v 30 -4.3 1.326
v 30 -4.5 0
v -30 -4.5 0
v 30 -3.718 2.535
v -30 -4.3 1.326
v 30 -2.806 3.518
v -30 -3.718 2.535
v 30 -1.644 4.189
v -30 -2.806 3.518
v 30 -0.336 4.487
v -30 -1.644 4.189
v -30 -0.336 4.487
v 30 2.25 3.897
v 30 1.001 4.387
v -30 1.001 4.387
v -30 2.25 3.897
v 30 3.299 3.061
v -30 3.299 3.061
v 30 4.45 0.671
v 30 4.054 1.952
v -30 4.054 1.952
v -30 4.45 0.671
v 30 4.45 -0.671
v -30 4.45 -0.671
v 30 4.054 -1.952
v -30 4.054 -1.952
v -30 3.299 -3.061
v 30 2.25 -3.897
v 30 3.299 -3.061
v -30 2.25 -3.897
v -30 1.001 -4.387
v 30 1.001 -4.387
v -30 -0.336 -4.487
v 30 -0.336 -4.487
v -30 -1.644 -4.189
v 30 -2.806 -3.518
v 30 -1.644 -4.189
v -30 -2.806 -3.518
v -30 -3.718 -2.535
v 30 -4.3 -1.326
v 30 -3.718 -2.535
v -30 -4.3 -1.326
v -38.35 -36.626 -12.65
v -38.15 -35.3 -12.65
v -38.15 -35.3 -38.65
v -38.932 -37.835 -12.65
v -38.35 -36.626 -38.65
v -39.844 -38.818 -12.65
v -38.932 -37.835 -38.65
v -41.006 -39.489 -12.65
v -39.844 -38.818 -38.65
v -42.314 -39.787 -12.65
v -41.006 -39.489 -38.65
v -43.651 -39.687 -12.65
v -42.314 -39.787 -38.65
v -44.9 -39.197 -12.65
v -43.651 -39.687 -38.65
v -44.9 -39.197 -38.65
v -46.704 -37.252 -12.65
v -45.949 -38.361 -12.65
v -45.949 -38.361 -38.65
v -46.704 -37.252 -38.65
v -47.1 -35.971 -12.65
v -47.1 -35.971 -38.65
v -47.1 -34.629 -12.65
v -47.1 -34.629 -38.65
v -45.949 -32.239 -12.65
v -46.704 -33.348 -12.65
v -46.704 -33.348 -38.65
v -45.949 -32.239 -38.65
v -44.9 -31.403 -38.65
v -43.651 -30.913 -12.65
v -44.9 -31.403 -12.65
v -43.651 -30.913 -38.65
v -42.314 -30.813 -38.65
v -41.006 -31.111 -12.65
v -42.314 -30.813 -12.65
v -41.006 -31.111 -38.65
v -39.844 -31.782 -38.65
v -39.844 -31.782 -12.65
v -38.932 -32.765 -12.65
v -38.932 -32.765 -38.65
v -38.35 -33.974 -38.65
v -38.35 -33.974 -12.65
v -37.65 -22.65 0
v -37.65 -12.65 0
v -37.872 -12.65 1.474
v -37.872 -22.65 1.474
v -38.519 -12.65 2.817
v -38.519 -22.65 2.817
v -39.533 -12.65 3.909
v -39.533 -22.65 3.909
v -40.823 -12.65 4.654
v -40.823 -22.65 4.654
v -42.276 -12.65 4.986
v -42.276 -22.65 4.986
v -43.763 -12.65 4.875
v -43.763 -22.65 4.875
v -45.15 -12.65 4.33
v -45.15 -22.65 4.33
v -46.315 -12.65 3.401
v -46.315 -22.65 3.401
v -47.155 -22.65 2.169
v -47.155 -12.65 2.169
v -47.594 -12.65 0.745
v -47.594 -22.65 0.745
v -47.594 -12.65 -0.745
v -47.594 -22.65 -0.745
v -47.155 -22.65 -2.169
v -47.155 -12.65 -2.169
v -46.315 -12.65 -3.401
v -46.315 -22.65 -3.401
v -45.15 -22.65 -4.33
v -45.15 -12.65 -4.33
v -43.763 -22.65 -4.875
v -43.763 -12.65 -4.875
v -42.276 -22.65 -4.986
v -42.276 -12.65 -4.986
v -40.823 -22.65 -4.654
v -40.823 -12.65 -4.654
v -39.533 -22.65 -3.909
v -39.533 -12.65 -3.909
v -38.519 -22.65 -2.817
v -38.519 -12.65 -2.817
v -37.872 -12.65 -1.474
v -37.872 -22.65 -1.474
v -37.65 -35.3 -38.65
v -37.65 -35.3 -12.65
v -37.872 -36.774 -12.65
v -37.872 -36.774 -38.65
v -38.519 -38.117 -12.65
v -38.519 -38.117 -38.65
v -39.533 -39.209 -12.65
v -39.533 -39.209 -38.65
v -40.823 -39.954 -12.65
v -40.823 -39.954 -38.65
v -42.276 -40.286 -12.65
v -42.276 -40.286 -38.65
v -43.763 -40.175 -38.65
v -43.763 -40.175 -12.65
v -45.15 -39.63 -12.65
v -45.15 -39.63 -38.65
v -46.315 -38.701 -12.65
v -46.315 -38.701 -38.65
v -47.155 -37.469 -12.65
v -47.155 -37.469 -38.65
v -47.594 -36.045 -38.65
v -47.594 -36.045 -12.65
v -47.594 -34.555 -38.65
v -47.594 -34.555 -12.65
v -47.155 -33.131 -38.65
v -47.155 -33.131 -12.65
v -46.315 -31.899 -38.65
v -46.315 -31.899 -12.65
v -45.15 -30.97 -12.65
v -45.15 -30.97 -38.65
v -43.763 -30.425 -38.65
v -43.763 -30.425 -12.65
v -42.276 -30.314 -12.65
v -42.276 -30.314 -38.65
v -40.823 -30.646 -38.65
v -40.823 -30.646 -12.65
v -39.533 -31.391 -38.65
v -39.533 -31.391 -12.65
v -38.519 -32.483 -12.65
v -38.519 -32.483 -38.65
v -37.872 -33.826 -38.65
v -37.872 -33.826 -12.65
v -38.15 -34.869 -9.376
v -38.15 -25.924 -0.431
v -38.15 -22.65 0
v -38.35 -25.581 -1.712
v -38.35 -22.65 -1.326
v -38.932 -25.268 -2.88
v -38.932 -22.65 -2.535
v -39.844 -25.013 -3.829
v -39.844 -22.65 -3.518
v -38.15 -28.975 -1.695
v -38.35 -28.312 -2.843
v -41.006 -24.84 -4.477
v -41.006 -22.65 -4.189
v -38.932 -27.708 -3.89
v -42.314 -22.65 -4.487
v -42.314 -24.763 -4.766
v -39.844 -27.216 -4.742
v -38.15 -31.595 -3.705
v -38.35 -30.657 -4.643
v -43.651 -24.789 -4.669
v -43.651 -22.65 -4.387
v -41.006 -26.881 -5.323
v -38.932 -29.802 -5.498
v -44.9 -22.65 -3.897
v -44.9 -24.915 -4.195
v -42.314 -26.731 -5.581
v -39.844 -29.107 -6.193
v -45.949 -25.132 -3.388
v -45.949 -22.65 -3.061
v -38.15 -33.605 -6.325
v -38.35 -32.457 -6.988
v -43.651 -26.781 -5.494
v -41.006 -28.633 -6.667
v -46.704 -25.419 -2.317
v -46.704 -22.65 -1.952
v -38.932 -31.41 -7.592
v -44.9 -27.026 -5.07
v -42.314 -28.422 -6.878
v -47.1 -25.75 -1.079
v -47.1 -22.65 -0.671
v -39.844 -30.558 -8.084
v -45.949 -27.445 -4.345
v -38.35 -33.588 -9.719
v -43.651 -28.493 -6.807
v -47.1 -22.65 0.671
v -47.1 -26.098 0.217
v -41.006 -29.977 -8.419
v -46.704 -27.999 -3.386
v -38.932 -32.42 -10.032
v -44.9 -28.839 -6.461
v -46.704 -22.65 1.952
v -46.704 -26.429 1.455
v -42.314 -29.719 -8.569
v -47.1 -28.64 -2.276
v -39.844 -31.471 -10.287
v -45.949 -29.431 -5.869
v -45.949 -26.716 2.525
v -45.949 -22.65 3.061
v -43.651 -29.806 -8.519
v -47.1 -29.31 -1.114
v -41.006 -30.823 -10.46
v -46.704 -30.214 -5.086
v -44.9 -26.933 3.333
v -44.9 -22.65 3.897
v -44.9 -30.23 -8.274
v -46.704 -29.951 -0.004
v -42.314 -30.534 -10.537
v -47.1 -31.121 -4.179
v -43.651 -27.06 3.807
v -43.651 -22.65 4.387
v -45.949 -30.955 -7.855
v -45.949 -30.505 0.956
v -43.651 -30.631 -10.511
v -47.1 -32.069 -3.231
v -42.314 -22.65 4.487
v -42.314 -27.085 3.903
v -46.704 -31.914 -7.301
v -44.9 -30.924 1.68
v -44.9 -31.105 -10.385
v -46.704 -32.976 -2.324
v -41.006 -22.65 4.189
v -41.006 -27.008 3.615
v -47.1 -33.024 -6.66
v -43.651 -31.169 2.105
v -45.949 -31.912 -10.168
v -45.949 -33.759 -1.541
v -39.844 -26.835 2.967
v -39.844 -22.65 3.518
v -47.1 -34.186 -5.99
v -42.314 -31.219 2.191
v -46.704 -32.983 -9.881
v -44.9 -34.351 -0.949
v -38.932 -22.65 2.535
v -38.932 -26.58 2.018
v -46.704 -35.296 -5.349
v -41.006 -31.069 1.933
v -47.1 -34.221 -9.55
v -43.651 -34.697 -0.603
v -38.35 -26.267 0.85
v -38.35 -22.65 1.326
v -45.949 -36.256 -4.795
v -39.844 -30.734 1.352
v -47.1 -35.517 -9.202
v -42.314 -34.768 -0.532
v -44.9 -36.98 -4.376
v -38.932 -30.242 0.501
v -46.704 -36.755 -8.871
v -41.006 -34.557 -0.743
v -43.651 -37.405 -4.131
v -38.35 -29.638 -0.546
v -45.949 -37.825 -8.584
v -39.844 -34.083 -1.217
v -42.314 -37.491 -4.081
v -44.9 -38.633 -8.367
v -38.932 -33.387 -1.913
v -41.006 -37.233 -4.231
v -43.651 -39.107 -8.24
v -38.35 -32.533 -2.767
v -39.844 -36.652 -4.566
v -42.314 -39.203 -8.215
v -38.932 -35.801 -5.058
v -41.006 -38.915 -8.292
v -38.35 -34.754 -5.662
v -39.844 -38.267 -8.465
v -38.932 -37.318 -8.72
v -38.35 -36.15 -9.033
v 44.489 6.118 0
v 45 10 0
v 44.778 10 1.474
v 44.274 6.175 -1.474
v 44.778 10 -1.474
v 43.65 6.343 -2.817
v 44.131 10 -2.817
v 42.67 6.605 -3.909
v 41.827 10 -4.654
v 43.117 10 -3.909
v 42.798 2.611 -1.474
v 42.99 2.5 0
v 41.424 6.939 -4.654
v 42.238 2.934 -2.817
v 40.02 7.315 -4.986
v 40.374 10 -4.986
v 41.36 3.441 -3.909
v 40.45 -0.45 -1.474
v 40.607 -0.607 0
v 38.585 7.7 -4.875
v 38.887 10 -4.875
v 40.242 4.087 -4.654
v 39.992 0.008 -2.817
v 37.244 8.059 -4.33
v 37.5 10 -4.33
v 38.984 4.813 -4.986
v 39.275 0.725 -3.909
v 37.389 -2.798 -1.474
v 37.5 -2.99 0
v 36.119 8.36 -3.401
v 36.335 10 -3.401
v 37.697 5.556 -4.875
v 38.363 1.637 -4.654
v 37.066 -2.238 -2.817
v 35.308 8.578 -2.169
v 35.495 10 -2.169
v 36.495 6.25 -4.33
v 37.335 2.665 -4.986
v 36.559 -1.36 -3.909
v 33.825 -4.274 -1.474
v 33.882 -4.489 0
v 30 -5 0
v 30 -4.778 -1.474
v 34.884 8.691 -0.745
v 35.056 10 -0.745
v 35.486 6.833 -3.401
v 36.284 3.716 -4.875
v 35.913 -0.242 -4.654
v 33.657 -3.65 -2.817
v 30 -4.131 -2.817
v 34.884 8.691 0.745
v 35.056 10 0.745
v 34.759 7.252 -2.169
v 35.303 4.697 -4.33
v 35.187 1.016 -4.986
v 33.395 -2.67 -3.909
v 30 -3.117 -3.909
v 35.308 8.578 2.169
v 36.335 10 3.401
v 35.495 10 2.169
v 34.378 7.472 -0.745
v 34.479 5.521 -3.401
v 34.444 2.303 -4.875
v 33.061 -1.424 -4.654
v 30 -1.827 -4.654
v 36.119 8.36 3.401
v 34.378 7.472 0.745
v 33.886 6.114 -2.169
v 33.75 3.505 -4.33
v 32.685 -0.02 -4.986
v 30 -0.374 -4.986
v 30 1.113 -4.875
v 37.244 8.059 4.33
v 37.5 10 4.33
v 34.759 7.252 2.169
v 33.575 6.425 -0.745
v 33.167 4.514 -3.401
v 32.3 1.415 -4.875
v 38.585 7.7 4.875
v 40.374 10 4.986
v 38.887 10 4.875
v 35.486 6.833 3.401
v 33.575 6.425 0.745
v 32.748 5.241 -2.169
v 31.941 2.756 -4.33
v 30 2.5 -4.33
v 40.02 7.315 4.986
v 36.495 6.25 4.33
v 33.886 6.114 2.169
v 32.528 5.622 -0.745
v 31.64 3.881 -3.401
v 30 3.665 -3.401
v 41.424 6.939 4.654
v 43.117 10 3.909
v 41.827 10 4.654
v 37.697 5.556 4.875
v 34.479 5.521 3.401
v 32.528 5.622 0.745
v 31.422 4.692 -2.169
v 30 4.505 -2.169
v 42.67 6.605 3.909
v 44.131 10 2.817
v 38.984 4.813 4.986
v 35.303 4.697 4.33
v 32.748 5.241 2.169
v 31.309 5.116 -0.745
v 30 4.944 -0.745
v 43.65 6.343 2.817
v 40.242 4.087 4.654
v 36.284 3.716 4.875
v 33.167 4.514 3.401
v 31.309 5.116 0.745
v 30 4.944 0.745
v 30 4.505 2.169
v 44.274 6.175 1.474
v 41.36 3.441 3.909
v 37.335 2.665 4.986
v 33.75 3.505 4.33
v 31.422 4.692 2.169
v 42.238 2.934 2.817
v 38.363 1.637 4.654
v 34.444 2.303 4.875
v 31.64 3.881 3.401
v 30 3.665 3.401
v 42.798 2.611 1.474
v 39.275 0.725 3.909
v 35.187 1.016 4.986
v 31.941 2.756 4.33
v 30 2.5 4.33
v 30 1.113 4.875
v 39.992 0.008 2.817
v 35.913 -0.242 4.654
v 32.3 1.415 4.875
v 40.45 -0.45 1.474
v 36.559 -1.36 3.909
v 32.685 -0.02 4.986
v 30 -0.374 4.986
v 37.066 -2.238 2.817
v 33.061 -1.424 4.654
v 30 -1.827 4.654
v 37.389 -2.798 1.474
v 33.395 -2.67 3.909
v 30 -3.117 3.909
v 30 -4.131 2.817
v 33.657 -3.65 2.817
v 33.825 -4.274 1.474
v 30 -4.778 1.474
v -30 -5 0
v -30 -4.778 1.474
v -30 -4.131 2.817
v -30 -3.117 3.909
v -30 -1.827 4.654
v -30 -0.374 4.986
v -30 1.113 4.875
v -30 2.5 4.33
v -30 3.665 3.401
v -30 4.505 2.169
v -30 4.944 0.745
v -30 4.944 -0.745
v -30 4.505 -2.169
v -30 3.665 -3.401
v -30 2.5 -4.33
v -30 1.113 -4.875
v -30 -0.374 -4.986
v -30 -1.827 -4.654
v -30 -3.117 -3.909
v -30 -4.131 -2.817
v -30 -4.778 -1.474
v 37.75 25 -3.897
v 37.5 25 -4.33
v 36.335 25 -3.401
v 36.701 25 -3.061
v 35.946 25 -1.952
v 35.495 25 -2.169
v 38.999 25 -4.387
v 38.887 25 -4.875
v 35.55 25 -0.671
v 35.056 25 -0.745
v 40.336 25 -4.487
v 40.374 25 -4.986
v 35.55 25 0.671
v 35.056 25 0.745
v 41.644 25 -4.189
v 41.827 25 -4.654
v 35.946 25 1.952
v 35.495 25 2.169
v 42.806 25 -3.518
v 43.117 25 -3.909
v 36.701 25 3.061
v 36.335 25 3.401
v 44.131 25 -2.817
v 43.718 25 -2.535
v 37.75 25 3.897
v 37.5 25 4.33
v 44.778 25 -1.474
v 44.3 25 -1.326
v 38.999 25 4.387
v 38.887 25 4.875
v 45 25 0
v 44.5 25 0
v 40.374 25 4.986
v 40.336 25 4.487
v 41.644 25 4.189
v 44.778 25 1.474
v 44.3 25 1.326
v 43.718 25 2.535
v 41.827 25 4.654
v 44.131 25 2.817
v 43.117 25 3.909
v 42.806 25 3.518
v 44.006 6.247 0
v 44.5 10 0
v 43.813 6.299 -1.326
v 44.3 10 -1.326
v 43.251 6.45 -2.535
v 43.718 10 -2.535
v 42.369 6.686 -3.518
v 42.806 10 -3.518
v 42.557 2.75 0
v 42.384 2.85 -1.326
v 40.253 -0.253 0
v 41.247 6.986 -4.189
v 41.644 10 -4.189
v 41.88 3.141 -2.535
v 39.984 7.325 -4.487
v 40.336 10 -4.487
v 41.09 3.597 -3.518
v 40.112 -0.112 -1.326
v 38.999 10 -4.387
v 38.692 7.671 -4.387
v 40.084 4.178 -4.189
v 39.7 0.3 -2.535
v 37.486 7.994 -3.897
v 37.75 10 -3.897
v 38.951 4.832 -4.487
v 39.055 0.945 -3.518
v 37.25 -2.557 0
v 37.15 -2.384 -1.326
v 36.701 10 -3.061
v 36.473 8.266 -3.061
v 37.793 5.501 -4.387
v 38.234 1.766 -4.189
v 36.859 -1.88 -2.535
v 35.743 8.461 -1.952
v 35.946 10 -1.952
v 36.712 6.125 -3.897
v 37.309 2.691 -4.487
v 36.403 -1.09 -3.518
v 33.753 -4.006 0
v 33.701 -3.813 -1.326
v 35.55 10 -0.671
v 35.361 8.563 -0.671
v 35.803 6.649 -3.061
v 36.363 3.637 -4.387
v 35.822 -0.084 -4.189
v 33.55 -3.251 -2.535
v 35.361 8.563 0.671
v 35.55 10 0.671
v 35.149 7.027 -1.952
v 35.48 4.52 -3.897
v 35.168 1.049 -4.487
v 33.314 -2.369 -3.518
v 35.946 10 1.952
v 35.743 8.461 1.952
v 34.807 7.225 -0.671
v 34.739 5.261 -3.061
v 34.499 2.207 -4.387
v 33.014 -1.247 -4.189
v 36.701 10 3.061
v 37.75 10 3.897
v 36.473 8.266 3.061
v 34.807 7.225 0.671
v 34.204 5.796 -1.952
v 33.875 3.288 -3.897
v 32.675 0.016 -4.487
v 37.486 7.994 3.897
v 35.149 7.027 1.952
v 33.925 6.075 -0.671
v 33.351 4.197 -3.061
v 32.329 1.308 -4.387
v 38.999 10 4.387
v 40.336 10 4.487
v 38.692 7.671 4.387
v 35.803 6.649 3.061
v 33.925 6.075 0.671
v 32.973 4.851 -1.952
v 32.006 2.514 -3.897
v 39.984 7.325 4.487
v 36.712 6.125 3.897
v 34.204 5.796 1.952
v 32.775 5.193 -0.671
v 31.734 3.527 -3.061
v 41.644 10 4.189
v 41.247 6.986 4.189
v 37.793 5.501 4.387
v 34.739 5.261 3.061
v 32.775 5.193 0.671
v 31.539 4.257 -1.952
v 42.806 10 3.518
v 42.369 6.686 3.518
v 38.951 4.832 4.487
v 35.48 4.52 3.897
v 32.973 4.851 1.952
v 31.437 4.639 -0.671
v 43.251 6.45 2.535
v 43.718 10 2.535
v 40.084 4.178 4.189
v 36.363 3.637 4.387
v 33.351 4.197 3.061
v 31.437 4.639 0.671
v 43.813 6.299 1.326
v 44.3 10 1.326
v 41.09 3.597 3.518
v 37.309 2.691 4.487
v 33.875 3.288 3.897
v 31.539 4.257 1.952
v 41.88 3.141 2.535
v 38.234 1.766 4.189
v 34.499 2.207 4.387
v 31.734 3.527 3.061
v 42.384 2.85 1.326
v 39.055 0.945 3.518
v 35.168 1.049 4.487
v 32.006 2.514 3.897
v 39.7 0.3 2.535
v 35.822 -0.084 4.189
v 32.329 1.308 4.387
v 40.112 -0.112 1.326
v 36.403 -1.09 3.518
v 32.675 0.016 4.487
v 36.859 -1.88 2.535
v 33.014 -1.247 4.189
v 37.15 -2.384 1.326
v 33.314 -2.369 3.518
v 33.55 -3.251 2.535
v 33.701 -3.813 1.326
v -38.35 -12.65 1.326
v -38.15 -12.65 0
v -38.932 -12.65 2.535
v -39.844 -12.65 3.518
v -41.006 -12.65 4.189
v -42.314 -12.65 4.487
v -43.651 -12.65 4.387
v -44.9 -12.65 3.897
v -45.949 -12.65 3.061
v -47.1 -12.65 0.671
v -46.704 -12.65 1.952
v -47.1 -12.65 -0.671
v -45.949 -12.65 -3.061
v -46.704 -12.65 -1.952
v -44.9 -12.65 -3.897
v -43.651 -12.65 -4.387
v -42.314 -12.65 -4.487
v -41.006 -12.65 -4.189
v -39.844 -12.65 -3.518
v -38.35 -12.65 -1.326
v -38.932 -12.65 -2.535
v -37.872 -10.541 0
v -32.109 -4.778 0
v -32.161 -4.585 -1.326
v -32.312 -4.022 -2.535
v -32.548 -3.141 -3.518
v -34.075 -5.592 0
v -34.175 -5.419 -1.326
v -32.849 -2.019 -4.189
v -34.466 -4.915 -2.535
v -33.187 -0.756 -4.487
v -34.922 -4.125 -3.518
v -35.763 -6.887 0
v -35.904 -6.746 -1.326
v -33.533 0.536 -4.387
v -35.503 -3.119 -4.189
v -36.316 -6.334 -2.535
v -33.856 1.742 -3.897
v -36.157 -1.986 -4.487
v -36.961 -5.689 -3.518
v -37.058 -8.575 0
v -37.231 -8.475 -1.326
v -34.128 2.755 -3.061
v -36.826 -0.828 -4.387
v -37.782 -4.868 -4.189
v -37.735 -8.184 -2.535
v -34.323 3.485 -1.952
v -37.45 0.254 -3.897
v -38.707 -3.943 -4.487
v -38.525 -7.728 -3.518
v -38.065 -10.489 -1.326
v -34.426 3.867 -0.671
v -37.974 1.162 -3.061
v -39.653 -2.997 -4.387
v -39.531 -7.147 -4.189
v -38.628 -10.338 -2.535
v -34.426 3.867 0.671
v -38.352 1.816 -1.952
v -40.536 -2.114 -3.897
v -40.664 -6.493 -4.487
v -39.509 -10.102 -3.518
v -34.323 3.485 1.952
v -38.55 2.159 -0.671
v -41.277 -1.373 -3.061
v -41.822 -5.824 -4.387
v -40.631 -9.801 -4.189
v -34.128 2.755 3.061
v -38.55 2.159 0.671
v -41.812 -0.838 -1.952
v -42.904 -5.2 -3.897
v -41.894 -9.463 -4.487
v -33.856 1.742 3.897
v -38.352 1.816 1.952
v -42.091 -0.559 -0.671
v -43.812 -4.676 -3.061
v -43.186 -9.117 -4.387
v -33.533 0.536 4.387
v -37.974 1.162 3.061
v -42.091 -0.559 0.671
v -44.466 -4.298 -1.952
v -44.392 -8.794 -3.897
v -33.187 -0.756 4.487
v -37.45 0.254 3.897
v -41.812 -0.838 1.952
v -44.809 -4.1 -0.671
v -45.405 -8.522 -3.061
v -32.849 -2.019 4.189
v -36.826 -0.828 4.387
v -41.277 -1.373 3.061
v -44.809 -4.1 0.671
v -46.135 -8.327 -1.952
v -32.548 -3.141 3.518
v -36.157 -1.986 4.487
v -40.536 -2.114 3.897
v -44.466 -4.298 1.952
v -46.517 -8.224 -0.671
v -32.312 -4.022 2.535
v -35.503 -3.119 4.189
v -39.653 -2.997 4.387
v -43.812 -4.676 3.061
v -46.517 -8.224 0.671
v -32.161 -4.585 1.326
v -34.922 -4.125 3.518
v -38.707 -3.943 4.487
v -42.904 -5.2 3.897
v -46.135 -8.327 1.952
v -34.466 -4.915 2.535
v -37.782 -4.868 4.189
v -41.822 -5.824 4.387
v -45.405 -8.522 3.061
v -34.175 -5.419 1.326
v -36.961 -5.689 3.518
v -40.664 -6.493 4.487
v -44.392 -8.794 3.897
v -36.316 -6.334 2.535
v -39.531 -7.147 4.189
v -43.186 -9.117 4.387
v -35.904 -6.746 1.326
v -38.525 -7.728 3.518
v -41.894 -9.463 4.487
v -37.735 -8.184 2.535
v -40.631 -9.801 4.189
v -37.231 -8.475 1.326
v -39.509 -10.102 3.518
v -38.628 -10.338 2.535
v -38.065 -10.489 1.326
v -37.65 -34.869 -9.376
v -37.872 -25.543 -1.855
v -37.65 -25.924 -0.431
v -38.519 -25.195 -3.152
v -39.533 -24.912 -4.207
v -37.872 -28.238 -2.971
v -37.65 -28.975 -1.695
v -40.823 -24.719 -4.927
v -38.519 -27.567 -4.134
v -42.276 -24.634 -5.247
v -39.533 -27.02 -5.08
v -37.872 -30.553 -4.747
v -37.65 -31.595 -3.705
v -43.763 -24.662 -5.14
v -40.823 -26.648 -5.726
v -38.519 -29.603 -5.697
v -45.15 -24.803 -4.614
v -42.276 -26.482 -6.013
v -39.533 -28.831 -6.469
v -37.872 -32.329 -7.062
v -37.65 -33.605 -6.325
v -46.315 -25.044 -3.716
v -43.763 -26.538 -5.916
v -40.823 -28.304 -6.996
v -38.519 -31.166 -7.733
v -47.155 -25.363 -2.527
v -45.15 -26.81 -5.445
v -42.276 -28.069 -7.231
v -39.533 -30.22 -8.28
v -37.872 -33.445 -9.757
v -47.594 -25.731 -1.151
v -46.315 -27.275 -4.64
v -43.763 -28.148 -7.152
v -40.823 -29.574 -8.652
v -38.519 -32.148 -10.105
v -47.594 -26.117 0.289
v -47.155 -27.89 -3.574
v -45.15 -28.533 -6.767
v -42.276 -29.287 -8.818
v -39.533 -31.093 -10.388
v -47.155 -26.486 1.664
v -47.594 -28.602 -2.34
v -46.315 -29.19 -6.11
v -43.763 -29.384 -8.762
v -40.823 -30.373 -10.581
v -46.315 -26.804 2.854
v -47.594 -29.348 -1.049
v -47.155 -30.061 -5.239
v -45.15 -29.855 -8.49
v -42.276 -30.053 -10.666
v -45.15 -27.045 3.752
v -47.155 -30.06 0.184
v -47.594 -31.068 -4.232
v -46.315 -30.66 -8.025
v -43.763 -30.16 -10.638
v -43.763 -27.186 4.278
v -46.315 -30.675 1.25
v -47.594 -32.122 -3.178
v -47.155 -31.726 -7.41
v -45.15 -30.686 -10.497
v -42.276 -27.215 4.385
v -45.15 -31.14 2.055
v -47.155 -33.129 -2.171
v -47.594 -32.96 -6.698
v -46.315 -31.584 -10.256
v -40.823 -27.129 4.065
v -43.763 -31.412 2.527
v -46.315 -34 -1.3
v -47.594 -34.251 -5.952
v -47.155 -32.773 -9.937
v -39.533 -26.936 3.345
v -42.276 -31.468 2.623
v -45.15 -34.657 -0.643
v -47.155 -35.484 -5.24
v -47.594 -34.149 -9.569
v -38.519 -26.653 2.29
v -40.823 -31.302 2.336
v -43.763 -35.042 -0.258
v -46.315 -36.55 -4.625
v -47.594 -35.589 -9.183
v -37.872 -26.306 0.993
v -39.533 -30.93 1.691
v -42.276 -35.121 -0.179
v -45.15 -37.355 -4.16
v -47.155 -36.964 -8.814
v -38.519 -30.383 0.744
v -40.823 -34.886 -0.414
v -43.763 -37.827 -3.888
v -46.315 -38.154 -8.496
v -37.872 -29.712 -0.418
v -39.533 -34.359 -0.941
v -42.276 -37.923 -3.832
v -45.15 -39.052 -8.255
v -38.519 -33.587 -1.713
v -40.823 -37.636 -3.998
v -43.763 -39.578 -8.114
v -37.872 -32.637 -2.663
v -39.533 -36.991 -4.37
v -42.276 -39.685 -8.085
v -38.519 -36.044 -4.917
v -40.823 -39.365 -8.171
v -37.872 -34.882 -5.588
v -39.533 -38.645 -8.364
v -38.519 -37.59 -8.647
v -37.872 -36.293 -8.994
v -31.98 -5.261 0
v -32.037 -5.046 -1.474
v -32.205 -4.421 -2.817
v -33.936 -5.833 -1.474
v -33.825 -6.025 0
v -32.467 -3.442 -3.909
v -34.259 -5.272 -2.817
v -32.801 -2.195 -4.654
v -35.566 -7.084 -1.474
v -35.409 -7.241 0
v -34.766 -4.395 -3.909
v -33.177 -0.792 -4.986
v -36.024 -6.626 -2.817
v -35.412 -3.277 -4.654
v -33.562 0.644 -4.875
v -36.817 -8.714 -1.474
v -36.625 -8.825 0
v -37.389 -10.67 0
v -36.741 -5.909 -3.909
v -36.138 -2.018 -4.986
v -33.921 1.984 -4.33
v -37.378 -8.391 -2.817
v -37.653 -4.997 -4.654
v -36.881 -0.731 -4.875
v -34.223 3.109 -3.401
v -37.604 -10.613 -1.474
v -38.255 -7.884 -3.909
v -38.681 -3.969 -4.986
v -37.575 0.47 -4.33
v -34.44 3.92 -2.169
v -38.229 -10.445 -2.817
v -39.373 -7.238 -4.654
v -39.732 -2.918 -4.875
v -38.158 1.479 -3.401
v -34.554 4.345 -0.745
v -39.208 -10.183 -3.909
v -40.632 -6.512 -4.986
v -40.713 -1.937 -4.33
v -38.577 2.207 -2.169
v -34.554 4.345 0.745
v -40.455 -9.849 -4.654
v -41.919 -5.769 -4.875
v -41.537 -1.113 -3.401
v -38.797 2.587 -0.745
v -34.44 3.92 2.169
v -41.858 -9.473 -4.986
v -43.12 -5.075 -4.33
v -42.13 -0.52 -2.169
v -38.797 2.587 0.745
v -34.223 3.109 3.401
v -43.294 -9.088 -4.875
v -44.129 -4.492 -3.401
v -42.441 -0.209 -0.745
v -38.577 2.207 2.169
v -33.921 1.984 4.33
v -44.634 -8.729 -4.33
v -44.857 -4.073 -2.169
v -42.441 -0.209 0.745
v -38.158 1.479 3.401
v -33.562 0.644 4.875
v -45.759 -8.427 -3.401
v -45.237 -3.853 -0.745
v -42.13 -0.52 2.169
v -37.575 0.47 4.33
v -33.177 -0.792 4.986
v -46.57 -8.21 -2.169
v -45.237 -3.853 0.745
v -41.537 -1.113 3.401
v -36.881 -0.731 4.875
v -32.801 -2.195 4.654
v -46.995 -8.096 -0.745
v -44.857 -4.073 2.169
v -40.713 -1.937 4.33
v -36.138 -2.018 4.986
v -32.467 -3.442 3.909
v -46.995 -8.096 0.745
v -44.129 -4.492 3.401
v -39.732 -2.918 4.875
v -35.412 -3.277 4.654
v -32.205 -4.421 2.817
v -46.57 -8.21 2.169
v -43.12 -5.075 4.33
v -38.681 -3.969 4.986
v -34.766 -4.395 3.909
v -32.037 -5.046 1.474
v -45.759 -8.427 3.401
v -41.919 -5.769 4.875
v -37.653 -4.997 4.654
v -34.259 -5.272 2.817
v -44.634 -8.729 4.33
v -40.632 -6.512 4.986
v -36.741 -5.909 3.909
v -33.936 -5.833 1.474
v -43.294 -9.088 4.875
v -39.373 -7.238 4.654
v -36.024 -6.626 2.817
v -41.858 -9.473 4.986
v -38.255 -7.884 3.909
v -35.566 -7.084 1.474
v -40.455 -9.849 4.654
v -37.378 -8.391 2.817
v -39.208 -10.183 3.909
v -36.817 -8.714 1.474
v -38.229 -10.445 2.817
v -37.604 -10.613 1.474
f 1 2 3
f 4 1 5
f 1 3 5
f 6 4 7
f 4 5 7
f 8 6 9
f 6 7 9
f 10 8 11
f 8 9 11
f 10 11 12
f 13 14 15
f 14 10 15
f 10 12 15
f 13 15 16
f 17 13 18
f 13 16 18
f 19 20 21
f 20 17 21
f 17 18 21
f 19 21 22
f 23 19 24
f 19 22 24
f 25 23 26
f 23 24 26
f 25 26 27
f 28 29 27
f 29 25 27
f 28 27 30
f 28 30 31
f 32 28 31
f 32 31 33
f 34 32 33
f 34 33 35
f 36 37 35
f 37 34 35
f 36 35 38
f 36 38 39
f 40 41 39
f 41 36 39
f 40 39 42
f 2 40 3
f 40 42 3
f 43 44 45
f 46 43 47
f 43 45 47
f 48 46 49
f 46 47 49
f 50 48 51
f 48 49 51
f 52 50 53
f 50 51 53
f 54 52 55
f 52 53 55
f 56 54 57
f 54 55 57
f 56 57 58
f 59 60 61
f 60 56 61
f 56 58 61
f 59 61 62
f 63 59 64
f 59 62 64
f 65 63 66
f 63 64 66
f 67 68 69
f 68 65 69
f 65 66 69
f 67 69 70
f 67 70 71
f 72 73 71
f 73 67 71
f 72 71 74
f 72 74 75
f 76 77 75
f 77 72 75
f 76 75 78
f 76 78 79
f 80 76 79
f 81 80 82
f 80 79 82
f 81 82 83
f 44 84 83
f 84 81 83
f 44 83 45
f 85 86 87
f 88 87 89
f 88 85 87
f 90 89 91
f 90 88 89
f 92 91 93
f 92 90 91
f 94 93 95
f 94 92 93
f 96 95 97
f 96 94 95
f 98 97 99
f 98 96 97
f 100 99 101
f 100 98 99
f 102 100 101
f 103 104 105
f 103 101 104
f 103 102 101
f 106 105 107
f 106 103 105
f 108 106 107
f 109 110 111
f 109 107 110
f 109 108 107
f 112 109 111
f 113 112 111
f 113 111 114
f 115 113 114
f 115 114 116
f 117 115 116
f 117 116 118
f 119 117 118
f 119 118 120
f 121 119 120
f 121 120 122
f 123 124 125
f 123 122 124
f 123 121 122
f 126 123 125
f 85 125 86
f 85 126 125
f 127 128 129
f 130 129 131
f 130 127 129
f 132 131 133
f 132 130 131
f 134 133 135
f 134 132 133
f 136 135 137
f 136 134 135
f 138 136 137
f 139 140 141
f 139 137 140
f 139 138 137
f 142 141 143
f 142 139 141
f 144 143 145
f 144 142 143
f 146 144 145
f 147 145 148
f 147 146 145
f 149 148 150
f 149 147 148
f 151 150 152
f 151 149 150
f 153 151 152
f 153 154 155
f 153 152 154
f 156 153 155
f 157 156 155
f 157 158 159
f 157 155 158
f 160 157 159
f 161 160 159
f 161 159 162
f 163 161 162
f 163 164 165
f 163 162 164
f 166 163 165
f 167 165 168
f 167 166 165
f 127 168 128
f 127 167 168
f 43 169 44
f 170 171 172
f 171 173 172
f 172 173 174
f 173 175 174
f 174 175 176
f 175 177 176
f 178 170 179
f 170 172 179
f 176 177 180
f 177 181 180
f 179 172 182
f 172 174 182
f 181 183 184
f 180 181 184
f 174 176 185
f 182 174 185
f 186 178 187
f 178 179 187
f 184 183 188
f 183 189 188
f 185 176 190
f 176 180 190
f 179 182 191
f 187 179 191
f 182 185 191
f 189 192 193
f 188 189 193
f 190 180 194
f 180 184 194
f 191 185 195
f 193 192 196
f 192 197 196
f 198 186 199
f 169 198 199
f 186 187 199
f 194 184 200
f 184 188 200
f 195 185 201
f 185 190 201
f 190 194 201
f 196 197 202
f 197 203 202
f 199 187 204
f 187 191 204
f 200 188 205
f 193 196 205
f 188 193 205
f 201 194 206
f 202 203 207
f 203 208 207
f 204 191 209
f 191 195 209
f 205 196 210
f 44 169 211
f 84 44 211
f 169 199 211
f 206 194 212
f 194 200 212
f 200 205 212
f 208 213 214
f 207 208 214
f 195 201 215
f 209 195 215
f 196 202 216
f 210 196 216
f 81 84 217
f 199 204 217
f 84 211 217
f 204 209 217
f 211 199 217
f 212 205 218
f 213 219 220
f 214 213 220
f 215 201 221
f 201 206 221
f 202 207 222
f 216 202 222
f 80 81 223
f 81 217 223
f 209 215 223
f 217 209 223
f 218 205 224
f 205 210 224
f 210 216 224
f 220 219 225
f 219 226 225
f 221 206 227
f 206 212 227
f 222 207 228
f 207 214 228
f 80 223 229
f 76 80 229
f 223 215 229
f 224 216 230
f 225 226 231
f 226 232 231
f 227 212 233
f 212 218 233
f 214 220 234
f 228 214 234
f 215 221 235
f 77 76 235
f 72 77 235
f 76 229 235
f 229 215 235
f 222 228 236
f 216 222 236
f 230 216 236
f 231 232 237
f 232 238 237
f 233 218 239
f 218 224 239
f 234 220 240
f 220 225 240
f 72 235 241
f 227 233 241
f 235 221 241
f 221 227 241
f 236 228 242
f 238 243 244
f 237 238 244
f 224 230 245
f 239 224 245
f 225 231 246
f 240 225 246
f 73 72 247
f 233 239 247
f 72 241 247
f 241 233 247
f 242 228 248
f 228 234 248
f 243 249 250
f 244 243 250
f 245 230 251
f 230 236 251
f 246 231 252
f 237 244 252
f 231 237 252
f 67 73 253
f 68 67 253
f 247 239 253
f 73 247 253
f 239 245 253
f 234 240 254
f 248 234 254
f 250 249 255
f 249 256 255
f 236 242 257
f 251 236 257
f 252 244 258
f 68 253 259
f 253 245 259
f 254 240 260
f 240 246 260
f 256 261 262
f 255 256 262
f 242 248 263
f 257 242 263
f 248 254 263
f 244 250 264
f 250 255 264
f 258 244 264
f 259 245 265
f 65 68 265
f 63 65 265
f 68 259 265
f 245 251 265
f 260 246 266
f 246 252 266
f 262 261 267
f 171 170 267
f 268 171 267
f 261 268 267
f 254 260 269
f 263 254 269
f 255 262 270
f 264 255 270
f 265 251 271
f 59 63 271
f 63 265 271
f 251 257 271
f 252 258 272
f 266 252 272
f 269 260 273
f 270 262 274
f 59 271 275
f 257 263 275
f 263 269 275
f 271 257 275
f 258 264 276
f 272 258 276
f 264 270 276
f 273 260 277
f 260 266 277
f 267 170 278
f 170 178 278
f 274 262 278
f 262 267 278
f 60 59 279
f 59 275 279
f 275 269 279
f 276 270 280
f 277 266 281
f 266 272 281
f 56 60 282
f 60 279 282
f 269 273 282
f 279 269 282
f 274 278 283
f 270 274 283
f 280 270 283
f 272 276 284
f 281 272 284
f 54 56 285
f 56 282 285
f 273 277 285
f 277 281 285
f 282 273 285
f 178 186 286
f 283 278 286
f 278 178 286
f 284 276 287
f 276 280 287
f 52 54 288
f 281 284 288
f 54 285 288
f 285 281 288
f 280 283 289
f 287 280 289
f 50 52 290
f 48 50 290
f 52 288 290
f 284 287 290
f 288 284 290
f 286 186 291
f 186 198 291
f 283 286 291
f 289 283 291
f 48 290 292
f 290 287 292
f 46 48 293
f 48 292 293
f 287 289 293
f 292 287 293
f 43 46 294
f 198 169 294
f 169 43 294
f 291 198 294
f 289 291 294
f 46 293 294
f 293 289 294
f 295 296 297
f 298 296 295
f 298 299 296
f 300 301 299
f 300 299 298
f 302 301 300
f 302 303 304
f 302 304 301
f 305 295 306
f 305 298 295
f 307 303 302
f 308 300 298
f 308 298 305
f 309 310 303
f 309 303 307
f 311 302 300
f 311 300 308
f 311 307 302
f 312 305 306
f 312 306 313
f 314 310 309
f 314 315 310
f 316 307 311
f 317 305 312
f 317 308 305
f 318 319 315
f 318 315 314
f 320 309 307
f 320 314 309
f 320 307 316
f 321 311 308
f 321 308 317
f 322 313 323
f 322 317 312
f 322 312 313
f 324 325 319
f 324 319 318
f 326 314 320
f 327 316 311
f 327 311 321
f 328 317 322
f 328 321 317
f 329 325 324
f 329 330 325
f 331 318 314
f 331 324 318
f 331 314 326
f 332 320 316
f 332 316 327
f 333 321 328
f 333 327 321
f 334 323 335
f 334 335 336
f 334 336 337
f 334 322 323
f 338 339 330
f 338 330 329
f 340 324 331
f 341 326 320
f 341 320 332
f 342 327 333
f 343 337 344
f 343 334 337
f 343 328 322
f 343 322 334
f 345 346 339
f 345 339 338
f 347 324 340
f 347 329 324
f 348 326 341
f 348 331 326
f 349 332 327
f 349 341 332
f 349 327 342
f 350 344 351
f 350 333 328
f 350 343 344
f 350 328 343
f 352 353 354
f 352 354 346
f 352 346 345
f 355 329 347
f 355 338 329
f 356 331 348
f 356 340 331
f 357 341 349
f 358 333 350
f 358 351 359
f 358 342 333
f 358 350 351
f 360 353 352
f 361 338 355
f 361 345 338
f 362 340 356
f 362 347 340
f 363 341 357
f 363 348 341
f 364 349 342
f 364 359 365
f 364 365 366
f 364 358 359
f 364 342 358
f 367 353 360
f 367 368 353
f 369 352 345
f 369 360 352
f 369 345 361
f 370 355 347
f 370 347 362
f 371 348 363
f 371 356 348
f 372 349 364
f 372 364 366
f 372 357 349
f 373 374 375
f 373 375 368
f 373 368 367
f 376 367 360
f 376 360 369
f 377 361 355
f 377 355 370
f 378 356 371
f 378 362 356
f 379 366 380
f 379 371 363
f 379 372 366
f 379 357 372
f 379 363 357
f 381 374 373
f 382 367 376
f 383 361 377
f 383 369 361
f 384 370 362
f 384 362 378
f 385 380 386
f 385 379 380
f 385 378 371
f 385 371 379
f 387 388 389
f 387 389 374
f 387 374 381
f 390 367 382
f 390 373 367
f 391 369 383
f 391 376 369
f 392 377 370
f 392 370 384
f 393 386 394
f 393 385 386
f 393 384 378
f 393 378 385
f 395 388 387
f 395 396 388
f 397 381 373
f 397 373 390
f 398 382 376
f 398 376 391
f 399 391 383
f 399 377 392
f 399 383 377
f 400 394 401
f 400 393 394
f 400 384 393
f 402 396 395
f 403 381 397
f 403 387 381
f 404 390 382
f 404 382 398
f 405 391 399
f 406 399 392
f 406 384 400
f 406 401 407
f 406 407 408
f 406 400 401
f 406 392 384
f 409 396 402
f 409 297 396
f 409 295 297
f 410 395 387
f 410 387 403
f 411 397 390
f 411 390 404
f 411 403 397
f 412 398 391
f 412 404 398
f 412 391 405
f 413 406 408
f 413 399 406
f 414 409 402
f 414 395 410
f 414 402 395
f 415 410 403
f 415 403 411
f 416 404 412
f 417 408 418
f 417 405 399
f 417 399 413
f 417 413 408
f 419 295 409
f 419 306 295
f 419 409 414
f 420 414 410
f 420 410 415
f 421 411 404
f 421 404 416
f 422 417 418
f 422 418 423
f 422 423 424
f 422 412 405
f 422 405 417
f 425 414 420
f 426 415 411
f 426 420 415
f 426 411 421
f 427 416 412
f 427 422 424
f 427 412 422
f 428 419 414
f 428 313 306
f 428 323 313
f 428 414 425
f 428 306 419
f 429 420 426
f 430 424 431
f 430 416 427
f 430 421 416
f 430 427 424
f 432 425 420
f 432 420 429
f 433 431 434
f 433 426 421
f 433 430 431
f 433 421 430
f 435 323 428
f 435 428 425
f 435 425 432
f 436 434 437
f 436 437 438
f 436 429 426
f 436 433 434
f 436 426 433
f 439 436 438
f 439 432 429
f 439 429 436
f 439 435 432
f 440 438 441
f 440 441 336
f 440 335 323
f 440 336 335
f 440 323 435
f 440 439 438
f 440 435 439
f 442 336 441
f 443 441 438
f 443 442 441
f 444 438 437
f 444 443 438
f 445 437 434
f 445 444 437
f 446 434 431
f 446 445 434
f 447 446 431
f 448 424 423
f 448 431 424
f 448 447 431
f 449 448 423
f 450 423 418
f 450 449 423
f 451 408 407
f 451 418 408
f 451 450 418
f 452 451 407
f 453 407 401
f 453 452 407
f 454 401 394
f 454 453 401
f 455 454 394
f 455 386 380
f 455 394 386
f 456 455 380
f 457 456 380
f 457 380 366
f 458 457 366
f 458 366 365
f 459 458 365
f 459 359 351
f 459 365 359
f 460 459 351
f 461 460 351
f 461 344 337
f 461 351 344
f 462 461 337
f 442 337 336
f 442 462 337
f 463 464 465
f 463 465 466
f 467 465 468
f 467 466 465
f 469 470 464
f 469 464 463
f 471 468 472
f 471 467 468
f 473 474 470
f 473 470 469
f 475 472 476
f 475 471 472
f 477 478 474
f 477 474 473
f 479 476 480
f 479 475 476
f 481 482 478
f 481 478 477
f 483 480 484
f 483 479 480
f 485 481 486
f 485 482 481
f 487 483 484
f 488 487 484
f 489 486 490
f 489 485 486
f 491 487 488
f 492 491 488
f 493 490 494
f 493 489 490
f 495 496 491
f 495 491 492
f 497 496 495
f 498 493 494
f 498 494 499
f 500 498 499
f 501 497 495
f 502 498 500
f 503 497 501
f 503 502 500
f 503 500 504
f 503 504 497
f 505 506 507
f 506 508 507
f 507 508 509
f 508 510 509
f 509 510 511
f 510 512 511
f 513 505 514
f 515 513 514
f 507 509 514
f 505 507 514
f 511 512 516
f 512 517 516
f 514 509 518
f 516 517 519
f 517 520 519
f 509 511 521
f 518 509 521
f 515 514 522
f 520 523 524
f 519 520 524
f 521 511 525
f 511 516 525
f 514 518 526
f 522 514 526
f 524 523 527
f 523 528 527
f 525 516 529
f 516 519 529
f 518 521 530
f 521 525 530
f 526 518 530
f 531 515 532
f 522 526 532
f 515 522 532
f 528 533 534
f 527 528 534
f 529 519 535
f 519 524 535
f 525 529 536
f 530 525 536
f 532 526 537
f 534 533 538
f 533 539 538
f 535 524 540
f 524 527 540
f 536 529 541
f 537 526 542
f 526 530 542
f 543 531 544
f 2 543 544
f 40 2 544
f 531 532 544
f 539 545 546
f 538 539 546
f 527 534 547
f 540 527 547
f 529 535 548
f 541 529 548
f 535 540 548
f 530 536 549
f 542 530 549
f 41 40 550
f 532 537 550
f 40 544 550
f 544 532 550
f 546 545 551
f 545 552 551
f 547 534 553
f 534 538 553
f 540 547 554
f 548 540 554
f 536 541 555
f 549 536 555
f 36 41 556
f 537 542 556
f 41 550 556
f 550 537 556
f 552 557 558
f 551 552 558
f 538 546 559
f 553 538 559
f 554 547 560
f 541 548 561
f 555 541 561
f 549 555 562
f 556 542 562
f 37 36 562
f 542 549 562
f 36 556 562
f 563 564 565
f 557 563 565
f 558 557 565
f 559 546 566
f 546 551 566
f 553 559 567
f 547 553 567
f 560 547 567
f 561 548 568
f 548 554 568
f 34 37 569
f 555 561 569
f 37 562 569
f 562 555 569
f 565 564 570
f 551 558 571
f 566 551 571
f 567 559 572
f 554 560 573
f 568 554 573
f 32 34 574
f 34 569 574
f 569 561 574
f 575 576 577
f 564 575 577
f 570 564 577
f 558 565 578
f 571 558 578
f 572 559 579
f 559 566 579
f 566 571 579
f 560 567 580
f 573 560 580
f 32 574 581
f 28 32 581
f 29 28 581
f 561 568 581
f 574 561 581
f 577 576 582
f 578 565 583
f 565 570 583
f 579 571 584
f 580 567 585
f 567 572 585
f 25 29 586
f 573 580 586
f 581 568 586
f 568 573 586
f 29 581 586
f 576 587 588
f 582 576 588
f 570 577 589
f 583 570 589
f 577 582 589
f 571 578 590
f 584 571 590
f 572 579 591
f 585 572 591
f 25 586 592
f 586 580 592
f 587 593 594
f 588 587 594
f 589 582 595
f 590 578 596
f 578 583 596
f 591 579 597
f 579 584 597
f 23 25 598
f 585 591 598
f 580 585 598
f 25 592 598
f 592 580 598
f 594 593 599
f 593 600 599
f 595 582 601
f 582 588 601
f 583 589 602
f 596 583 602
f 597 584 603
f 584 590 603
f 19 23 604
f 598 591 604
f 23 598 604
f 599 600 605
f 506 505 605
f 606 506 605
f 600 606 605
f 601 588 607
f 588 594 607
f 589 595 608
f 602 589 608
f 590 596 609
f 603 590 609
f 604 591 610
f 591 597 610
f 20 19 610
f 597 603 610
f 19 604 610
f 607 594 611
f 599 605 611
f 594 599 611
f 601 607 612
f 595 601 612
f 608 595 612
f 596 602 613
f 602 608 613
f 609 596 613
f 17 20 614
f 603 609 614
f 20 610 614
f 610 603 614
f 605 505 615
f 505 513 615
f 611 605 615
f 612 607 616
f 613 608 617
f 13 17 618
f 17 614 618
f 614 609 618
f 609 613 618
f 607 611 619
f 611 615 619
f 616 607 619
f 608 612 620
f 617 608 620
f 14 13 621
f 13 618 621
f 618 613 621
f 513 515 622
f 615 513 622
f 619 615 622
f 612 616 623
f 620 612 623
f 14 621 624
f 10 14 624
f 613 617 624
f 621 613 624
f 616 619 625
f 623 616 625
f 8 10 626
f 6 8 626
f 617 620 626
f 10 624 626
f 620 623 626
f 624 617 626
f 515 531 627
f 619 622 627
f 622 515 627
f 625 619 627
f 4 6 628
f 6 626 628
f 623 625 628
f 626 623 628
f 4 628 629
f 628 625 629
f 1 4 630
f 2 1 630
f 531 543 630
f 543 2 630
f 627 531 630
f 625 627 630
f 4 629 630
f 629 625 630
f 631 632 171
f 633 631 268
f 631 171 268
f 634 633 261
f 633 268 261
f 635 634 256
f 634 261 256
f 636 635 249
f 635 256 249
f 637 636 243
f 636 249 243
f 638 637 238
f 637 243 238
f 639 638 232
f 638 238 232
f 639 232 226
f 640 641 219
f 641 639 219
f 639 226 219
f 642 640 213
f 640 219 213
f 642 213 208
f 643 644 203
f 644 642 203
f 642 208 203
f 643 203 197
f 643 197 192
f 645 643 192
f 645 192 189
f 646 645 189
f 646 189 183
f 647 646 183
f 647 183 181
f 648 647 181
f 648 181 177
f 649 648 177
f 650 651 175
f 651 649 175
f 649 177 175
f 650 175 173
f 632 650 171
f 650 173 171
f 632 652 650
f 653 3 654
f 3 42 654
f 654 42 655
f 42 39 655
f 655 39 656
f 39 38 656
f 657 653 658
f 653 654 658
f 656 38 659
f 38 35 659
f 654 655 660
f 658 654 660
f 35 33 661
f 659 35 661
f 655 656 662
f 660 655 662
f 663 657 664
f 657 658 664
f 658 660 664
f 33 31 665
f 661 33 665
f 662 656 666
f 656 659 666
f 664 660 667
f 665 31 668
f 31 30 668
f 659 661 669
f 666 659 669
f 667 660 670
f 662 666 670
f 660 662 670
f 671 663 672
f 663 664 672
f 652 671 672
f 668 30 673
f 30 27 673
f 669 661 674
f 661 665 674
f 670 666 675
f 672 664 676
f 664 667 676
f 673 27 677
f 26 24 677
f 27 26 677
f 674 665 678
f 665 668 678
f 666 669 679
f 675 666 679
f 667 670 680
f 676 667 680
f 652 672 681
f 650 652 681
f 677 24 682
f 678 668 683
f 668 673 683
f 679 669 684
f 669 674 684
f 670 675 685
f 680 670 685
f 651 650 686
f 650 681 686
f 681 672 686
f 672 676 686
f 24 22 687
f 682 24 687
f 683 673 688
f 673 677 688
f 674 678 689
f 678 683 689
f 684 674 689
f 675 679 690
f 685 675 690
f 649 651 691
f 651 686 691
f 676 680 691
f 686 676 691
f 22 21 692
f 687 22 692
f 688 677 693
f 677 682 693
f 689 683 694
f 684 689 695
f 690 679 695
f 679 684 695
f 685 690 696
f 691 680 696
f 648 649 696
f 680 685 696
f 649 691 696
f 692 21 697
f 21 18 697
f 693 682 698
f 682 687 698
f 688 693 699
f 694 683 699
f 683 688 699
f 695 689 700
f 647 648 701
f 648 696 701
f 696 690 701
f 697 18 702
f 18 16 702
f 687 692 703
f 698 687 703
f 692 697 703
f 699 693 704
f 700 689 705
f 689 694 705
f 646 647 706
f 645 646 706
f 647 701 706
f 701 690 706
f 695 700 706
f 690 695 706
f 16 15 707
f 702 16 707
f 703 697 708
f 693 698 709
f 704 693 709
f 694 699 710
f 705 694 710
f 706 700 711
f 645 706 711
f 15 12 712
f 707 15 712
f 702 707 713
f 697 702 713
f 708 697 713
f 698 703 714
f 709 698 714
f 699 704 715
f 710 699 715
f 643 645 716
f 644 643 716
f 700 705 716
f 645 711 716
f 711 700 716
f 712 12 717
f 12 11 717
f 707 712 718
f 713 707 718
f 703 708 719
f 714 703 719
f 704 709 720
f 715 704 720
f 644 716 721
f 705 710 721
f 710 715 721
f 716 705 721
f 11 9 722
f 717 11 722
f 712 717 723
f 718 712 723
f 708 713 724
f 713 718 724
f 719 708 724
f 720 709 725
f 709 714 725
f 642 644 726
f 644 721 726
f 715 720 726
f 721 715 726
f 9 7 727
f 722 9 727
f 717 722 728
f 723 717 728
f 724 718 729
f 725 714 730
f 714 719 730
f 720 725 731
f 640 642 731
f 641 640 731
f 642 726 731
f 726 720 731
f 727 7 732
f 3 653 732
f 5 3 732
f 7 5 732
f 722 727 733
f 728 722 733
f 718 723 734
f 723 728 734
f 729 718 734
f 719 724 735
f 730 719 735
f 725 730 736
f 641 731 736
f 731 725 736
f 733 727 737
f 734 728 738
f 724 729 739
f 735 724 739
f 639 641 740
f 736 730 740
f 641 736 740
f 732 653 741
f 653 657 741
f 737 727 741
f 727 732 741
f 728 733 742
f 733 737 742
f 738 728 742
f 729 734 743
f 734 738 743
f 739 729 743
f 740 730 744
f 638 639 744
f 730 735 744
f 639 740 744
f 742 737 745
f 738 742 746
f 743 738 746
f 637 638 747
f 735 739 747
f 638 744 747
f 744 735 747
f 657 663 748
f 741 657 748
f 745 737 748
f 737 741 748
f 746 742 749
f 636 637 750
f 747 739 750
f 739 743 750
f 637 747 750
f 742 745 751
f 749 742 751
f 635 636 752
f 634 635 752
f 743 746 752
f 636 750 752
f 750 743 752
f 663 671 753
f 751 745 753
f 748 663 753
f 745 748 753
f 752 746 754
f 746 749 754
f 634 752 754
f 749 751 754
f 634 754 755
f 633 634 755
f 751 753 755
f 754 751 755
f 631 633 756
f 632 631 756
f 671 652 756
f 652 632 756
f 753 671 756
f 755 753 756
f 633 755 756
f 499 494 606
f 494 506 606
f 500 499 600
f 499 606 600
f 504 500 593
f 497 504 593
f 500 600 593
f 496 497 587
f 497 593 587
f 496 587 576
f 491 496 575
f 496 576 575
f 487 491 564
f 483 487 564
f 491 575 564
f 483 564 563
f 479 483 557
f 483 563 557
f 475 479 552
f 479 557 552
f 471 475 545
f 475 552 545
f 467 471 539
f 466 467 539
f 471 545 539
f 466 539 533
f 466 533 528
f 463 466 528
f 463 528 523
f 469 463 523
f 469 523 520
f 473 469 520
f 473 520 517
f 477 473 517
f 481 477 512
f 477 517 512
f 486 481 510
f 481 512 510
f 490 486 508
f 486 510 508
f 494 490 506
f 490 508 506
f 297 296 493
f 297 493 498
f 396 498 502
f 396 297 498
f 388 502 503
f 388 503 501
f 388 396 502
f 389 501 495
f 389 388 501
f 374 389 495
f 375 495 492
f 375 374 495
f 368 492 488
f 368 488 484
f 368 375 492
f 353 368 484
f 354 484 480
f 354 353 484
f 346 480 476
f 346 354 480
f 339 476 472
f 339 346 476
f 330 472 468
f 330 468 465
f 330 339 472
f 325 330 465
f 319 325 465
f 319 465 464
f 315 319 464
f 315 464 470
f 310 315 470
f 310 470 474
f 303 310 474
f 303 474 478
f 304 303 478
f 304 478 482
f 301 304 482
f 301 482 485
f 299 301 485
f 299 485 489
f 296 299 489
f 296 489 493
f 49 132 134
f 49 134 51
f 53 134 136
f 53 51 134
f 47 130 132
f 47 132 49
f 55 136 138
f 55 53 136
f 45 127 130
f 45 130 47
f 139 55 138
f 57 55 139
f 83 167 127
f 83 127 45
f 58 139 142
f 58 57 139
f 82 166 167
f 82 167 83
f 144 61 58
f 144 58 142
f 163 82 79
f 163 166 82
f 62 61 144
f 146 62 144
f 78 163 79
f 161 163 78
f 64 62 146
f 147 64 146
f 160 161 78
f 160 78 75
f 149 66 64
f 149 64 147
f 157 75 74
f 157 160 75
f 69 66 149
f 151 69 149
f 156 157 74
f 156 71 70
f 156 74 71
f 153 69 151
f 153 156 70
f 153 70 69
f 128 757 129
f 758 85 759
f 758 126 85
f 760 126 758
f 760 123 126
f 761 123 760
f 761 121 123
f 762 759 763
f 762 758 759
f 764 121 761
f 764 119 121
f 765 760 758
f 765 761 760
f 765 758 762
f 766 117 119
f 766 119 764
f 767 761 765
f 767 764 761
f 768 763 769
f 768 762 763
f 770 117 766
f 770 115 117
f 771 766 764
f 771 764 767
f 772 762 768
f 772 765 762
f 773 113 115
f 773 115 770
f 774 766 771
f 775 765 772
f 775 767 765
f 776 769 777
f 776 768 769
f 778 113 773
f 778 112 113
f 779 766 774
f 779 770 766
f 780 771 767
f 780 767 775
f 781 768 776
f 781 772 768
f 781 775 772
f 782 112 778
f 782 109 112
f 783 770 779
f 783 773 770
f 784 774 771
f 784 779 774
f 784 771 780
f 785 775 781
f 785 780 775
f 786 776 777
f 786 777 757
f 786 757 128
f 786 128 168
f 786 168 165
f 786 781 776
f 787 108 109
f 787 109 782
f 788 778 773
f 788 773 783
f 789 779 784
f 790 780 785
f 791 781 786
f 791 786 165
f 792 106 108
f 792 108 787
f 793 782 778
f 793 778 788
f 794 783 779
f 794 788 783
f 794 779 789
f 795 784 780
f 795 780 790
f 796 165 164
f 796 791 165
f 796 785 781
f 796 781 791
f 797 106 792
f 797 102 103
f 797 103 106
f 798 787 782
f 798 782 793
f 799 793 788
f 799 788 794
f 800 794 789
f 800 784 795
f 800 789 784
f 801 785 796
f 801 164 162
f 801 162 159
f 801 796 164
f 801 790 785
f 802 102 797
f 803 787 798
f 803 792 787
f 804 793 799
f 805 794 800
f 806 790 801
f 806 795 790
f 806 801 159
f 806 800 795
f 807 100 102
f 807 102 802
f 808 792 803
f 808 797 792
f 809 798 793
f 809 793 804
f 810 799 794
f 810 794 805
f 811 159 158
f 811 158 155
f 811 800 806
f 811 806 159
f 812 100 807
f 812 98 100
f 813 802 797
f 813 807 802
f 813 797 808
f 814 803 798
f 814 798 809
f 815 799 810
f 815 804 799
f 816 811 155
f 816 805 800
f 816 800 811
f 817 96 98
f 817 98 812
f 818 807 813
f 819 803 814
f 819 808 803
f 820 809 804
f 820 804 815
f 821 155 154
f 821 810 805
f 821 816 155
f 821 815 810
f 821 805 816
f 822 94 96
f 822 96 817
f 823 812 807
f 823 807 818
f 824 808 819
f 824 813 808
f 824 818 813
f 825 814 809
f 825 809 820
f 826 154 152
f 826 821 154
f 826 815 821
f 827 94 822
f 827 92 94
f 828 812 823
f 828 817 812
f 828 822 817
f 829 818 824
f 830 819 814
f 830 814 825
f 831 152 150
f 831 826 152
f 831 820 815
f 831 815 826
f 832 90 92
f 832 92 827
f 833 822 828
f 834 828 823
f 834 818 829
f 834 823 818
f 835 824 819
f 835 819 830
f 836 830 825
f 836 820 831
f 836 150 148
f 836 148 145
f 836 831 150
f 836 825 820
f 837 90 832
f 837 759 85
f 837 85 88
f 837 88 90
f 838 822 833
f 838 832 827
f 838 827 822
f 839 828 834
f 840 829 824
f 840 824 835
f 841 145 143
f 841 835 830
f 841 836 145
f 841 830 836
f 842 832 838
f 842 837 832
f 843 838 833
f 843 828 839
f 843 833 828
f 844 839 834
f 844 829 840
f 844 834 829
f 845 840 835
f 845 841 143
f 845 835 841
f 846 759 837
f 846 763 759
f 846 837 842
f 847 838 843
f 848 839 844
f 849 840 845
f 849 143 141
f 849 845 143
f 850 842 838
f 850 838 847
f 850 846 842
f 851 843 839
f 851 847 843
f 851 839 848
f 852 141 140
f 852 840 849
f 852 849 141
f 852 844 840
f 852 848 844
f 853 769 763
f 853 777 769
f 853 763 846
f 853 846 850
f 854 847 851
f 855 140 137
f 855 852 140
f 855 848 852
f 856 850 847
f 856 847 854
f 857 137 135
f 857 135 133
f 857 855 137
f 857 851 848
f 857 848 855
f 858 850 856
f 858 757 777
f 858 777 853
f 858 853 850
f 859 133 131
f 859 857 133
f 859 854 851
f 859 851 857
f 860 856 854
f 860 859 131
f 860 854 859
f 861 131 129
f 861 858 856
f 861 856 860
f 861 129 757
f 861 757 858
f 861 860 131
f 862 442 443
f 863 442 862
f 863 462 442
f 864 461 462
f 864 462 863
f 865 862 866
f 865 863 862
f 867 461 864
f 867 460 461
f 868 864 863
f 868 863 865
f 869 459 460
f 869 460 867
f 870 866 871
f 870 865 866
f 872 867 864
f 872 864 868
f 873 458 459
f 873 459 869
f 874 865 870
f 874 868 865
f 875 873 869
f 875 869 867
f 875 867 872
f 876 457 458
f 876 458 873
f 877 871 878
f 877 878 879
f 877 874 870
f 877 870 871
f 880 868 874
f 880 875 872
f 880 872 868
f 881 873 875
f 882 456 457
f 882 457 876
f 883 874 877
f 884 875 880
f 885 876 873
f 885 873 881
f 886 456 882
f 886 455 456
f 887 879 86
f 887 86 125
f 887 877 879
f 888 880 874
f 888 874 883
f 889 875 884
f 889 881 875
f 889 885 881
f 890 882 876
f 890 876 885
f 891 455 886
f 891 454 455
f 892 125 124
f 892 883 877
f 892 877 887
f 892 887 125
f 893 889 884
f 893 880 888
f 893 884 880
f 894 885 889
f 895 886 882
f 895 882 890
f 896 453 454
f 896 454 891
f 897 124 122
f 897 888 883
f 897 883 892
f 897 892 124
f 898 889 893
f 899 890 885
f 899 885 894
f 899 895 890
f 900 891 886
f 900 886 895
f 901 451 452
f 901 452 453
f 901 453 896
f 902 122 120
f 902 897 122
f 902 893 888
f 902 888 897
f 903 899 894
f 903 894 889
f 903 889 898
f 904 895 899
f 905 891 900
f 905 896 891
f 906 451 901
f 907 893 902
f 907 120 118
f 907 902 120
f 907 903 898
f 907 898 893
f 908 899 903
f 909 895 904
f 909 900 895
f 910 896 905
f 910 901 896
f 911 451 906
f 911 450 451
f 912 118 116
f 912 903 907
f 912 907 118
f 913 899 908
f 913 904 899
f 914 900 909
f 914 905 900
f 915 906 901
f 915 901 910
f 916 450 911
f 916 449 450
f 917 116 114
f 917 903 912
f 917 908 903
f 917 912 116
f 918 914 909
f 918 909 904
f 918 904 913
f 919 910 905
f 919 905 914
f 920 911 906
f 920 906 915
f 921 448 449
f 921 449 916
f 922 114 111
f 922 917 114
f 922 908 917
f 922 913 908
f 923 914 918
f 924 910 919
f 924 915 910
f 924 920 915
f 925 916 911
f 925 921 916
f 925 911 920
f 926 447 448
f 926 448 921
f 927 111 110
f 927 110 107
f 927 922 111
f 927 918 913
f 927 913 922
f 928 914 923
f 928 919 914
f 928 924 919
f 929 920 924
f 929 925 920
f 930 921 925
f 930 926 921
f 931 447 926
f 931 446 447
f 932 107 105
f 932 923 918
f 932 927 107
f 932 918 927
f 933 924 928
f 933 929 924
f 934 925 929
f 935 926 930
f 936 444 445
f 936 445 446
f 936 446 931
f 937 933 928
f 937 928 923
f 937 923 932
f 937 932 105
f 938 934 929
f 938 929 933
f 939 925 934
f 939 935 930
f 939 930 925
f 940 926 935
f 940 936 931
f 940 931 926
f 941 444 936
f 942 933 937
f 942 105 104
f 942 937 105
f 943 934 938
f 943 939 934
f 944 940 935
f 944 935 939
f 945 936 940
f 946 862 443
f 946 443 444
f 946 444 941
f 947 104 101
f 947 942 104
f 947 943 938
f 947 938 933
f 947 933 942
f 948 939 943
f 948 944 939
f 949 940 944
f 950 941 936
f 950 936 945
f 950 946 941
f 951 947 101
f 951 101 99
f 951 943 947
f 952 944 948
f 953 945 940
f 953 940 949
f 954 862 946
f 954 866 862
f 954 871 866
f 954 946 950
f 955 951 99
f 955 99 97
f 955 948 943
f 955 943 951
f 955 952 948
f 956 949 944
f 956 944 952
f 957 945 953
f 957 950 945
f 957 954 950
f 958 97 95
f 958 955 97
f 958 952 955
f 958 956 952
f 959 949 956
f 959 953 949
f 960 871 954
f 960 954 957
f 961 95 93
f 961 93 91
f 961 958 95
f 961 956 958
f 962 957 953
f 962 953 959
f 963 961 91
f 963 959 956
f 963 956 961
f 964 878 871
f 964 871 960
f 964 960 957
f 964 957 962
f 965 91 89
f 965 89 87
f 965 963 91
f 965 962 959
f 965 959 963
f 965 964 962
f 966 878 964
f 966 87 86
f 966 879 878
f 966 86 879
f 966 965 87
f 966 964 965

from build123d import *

# Parameters (mm, degrees)
SKETCH2_R = 5
SKETCH5_R = 5
SHELL1_T  = -0.5


with BuildPart() as part:
    # Sweep1: sweep along a path in Sketch1
    with BuildLine(Plane.XY) as sweep1_path:
        Line((40, 25), (40, 10))
        ThreePointArc((40, 10), (37.071067812, 2.928932188), (30, 0))
        Line((30, 0), (-30, 0))
        ThreePointArc((-30, 0), (-38.944900782, -3.705099218), (-42.65, -12.65))
        Line((-42.65, -12.65), (-42.65, -22.65))
    # Sketch2 → Sweep1 (sweep)
    with BuildSketch(Plane(origin=(0, 25, 0), x_dir=(1, 0, 0), z_dir=(0, 1, 0))):
        with Locations((40, 0)):
            Circle(SKETCH2_R)
    sweep(path=sweep1_path.line)

    # Sweep2: sweep along a path in Sketch4
    with BuildLine(Plane(origin=(-42.65, 0, 0), x_dir=(0, 0, -1), z_dir=(1, 0, 0))) as sweep2_path:
        ThreePointArc((0, -22.65), (3.705099218, -31.594900782), (12.65, -35.3))
        Line((12.65, -35.3), (38.65, -35.3))
    # Sketch5 → Sweep2 (sweep)
    with BuildSketch(Plane.XZ.offset(22.65)):
        with Locations((-42.65, 0)):
            Circle(SKETCH5_R)
    sweep(path=sweep2_path.line)

    # Shell1
    shell1_openings = [part.faces().sort_by_distance(p)[0] for p in [
        (-42.65, -35.3, -38.65),
        (40, 25, 0),
    ]]
    offset(amount=SHELL1_T, openings=shell1_openings, kind=Kind.INTERSECTION)


solid = part.part
